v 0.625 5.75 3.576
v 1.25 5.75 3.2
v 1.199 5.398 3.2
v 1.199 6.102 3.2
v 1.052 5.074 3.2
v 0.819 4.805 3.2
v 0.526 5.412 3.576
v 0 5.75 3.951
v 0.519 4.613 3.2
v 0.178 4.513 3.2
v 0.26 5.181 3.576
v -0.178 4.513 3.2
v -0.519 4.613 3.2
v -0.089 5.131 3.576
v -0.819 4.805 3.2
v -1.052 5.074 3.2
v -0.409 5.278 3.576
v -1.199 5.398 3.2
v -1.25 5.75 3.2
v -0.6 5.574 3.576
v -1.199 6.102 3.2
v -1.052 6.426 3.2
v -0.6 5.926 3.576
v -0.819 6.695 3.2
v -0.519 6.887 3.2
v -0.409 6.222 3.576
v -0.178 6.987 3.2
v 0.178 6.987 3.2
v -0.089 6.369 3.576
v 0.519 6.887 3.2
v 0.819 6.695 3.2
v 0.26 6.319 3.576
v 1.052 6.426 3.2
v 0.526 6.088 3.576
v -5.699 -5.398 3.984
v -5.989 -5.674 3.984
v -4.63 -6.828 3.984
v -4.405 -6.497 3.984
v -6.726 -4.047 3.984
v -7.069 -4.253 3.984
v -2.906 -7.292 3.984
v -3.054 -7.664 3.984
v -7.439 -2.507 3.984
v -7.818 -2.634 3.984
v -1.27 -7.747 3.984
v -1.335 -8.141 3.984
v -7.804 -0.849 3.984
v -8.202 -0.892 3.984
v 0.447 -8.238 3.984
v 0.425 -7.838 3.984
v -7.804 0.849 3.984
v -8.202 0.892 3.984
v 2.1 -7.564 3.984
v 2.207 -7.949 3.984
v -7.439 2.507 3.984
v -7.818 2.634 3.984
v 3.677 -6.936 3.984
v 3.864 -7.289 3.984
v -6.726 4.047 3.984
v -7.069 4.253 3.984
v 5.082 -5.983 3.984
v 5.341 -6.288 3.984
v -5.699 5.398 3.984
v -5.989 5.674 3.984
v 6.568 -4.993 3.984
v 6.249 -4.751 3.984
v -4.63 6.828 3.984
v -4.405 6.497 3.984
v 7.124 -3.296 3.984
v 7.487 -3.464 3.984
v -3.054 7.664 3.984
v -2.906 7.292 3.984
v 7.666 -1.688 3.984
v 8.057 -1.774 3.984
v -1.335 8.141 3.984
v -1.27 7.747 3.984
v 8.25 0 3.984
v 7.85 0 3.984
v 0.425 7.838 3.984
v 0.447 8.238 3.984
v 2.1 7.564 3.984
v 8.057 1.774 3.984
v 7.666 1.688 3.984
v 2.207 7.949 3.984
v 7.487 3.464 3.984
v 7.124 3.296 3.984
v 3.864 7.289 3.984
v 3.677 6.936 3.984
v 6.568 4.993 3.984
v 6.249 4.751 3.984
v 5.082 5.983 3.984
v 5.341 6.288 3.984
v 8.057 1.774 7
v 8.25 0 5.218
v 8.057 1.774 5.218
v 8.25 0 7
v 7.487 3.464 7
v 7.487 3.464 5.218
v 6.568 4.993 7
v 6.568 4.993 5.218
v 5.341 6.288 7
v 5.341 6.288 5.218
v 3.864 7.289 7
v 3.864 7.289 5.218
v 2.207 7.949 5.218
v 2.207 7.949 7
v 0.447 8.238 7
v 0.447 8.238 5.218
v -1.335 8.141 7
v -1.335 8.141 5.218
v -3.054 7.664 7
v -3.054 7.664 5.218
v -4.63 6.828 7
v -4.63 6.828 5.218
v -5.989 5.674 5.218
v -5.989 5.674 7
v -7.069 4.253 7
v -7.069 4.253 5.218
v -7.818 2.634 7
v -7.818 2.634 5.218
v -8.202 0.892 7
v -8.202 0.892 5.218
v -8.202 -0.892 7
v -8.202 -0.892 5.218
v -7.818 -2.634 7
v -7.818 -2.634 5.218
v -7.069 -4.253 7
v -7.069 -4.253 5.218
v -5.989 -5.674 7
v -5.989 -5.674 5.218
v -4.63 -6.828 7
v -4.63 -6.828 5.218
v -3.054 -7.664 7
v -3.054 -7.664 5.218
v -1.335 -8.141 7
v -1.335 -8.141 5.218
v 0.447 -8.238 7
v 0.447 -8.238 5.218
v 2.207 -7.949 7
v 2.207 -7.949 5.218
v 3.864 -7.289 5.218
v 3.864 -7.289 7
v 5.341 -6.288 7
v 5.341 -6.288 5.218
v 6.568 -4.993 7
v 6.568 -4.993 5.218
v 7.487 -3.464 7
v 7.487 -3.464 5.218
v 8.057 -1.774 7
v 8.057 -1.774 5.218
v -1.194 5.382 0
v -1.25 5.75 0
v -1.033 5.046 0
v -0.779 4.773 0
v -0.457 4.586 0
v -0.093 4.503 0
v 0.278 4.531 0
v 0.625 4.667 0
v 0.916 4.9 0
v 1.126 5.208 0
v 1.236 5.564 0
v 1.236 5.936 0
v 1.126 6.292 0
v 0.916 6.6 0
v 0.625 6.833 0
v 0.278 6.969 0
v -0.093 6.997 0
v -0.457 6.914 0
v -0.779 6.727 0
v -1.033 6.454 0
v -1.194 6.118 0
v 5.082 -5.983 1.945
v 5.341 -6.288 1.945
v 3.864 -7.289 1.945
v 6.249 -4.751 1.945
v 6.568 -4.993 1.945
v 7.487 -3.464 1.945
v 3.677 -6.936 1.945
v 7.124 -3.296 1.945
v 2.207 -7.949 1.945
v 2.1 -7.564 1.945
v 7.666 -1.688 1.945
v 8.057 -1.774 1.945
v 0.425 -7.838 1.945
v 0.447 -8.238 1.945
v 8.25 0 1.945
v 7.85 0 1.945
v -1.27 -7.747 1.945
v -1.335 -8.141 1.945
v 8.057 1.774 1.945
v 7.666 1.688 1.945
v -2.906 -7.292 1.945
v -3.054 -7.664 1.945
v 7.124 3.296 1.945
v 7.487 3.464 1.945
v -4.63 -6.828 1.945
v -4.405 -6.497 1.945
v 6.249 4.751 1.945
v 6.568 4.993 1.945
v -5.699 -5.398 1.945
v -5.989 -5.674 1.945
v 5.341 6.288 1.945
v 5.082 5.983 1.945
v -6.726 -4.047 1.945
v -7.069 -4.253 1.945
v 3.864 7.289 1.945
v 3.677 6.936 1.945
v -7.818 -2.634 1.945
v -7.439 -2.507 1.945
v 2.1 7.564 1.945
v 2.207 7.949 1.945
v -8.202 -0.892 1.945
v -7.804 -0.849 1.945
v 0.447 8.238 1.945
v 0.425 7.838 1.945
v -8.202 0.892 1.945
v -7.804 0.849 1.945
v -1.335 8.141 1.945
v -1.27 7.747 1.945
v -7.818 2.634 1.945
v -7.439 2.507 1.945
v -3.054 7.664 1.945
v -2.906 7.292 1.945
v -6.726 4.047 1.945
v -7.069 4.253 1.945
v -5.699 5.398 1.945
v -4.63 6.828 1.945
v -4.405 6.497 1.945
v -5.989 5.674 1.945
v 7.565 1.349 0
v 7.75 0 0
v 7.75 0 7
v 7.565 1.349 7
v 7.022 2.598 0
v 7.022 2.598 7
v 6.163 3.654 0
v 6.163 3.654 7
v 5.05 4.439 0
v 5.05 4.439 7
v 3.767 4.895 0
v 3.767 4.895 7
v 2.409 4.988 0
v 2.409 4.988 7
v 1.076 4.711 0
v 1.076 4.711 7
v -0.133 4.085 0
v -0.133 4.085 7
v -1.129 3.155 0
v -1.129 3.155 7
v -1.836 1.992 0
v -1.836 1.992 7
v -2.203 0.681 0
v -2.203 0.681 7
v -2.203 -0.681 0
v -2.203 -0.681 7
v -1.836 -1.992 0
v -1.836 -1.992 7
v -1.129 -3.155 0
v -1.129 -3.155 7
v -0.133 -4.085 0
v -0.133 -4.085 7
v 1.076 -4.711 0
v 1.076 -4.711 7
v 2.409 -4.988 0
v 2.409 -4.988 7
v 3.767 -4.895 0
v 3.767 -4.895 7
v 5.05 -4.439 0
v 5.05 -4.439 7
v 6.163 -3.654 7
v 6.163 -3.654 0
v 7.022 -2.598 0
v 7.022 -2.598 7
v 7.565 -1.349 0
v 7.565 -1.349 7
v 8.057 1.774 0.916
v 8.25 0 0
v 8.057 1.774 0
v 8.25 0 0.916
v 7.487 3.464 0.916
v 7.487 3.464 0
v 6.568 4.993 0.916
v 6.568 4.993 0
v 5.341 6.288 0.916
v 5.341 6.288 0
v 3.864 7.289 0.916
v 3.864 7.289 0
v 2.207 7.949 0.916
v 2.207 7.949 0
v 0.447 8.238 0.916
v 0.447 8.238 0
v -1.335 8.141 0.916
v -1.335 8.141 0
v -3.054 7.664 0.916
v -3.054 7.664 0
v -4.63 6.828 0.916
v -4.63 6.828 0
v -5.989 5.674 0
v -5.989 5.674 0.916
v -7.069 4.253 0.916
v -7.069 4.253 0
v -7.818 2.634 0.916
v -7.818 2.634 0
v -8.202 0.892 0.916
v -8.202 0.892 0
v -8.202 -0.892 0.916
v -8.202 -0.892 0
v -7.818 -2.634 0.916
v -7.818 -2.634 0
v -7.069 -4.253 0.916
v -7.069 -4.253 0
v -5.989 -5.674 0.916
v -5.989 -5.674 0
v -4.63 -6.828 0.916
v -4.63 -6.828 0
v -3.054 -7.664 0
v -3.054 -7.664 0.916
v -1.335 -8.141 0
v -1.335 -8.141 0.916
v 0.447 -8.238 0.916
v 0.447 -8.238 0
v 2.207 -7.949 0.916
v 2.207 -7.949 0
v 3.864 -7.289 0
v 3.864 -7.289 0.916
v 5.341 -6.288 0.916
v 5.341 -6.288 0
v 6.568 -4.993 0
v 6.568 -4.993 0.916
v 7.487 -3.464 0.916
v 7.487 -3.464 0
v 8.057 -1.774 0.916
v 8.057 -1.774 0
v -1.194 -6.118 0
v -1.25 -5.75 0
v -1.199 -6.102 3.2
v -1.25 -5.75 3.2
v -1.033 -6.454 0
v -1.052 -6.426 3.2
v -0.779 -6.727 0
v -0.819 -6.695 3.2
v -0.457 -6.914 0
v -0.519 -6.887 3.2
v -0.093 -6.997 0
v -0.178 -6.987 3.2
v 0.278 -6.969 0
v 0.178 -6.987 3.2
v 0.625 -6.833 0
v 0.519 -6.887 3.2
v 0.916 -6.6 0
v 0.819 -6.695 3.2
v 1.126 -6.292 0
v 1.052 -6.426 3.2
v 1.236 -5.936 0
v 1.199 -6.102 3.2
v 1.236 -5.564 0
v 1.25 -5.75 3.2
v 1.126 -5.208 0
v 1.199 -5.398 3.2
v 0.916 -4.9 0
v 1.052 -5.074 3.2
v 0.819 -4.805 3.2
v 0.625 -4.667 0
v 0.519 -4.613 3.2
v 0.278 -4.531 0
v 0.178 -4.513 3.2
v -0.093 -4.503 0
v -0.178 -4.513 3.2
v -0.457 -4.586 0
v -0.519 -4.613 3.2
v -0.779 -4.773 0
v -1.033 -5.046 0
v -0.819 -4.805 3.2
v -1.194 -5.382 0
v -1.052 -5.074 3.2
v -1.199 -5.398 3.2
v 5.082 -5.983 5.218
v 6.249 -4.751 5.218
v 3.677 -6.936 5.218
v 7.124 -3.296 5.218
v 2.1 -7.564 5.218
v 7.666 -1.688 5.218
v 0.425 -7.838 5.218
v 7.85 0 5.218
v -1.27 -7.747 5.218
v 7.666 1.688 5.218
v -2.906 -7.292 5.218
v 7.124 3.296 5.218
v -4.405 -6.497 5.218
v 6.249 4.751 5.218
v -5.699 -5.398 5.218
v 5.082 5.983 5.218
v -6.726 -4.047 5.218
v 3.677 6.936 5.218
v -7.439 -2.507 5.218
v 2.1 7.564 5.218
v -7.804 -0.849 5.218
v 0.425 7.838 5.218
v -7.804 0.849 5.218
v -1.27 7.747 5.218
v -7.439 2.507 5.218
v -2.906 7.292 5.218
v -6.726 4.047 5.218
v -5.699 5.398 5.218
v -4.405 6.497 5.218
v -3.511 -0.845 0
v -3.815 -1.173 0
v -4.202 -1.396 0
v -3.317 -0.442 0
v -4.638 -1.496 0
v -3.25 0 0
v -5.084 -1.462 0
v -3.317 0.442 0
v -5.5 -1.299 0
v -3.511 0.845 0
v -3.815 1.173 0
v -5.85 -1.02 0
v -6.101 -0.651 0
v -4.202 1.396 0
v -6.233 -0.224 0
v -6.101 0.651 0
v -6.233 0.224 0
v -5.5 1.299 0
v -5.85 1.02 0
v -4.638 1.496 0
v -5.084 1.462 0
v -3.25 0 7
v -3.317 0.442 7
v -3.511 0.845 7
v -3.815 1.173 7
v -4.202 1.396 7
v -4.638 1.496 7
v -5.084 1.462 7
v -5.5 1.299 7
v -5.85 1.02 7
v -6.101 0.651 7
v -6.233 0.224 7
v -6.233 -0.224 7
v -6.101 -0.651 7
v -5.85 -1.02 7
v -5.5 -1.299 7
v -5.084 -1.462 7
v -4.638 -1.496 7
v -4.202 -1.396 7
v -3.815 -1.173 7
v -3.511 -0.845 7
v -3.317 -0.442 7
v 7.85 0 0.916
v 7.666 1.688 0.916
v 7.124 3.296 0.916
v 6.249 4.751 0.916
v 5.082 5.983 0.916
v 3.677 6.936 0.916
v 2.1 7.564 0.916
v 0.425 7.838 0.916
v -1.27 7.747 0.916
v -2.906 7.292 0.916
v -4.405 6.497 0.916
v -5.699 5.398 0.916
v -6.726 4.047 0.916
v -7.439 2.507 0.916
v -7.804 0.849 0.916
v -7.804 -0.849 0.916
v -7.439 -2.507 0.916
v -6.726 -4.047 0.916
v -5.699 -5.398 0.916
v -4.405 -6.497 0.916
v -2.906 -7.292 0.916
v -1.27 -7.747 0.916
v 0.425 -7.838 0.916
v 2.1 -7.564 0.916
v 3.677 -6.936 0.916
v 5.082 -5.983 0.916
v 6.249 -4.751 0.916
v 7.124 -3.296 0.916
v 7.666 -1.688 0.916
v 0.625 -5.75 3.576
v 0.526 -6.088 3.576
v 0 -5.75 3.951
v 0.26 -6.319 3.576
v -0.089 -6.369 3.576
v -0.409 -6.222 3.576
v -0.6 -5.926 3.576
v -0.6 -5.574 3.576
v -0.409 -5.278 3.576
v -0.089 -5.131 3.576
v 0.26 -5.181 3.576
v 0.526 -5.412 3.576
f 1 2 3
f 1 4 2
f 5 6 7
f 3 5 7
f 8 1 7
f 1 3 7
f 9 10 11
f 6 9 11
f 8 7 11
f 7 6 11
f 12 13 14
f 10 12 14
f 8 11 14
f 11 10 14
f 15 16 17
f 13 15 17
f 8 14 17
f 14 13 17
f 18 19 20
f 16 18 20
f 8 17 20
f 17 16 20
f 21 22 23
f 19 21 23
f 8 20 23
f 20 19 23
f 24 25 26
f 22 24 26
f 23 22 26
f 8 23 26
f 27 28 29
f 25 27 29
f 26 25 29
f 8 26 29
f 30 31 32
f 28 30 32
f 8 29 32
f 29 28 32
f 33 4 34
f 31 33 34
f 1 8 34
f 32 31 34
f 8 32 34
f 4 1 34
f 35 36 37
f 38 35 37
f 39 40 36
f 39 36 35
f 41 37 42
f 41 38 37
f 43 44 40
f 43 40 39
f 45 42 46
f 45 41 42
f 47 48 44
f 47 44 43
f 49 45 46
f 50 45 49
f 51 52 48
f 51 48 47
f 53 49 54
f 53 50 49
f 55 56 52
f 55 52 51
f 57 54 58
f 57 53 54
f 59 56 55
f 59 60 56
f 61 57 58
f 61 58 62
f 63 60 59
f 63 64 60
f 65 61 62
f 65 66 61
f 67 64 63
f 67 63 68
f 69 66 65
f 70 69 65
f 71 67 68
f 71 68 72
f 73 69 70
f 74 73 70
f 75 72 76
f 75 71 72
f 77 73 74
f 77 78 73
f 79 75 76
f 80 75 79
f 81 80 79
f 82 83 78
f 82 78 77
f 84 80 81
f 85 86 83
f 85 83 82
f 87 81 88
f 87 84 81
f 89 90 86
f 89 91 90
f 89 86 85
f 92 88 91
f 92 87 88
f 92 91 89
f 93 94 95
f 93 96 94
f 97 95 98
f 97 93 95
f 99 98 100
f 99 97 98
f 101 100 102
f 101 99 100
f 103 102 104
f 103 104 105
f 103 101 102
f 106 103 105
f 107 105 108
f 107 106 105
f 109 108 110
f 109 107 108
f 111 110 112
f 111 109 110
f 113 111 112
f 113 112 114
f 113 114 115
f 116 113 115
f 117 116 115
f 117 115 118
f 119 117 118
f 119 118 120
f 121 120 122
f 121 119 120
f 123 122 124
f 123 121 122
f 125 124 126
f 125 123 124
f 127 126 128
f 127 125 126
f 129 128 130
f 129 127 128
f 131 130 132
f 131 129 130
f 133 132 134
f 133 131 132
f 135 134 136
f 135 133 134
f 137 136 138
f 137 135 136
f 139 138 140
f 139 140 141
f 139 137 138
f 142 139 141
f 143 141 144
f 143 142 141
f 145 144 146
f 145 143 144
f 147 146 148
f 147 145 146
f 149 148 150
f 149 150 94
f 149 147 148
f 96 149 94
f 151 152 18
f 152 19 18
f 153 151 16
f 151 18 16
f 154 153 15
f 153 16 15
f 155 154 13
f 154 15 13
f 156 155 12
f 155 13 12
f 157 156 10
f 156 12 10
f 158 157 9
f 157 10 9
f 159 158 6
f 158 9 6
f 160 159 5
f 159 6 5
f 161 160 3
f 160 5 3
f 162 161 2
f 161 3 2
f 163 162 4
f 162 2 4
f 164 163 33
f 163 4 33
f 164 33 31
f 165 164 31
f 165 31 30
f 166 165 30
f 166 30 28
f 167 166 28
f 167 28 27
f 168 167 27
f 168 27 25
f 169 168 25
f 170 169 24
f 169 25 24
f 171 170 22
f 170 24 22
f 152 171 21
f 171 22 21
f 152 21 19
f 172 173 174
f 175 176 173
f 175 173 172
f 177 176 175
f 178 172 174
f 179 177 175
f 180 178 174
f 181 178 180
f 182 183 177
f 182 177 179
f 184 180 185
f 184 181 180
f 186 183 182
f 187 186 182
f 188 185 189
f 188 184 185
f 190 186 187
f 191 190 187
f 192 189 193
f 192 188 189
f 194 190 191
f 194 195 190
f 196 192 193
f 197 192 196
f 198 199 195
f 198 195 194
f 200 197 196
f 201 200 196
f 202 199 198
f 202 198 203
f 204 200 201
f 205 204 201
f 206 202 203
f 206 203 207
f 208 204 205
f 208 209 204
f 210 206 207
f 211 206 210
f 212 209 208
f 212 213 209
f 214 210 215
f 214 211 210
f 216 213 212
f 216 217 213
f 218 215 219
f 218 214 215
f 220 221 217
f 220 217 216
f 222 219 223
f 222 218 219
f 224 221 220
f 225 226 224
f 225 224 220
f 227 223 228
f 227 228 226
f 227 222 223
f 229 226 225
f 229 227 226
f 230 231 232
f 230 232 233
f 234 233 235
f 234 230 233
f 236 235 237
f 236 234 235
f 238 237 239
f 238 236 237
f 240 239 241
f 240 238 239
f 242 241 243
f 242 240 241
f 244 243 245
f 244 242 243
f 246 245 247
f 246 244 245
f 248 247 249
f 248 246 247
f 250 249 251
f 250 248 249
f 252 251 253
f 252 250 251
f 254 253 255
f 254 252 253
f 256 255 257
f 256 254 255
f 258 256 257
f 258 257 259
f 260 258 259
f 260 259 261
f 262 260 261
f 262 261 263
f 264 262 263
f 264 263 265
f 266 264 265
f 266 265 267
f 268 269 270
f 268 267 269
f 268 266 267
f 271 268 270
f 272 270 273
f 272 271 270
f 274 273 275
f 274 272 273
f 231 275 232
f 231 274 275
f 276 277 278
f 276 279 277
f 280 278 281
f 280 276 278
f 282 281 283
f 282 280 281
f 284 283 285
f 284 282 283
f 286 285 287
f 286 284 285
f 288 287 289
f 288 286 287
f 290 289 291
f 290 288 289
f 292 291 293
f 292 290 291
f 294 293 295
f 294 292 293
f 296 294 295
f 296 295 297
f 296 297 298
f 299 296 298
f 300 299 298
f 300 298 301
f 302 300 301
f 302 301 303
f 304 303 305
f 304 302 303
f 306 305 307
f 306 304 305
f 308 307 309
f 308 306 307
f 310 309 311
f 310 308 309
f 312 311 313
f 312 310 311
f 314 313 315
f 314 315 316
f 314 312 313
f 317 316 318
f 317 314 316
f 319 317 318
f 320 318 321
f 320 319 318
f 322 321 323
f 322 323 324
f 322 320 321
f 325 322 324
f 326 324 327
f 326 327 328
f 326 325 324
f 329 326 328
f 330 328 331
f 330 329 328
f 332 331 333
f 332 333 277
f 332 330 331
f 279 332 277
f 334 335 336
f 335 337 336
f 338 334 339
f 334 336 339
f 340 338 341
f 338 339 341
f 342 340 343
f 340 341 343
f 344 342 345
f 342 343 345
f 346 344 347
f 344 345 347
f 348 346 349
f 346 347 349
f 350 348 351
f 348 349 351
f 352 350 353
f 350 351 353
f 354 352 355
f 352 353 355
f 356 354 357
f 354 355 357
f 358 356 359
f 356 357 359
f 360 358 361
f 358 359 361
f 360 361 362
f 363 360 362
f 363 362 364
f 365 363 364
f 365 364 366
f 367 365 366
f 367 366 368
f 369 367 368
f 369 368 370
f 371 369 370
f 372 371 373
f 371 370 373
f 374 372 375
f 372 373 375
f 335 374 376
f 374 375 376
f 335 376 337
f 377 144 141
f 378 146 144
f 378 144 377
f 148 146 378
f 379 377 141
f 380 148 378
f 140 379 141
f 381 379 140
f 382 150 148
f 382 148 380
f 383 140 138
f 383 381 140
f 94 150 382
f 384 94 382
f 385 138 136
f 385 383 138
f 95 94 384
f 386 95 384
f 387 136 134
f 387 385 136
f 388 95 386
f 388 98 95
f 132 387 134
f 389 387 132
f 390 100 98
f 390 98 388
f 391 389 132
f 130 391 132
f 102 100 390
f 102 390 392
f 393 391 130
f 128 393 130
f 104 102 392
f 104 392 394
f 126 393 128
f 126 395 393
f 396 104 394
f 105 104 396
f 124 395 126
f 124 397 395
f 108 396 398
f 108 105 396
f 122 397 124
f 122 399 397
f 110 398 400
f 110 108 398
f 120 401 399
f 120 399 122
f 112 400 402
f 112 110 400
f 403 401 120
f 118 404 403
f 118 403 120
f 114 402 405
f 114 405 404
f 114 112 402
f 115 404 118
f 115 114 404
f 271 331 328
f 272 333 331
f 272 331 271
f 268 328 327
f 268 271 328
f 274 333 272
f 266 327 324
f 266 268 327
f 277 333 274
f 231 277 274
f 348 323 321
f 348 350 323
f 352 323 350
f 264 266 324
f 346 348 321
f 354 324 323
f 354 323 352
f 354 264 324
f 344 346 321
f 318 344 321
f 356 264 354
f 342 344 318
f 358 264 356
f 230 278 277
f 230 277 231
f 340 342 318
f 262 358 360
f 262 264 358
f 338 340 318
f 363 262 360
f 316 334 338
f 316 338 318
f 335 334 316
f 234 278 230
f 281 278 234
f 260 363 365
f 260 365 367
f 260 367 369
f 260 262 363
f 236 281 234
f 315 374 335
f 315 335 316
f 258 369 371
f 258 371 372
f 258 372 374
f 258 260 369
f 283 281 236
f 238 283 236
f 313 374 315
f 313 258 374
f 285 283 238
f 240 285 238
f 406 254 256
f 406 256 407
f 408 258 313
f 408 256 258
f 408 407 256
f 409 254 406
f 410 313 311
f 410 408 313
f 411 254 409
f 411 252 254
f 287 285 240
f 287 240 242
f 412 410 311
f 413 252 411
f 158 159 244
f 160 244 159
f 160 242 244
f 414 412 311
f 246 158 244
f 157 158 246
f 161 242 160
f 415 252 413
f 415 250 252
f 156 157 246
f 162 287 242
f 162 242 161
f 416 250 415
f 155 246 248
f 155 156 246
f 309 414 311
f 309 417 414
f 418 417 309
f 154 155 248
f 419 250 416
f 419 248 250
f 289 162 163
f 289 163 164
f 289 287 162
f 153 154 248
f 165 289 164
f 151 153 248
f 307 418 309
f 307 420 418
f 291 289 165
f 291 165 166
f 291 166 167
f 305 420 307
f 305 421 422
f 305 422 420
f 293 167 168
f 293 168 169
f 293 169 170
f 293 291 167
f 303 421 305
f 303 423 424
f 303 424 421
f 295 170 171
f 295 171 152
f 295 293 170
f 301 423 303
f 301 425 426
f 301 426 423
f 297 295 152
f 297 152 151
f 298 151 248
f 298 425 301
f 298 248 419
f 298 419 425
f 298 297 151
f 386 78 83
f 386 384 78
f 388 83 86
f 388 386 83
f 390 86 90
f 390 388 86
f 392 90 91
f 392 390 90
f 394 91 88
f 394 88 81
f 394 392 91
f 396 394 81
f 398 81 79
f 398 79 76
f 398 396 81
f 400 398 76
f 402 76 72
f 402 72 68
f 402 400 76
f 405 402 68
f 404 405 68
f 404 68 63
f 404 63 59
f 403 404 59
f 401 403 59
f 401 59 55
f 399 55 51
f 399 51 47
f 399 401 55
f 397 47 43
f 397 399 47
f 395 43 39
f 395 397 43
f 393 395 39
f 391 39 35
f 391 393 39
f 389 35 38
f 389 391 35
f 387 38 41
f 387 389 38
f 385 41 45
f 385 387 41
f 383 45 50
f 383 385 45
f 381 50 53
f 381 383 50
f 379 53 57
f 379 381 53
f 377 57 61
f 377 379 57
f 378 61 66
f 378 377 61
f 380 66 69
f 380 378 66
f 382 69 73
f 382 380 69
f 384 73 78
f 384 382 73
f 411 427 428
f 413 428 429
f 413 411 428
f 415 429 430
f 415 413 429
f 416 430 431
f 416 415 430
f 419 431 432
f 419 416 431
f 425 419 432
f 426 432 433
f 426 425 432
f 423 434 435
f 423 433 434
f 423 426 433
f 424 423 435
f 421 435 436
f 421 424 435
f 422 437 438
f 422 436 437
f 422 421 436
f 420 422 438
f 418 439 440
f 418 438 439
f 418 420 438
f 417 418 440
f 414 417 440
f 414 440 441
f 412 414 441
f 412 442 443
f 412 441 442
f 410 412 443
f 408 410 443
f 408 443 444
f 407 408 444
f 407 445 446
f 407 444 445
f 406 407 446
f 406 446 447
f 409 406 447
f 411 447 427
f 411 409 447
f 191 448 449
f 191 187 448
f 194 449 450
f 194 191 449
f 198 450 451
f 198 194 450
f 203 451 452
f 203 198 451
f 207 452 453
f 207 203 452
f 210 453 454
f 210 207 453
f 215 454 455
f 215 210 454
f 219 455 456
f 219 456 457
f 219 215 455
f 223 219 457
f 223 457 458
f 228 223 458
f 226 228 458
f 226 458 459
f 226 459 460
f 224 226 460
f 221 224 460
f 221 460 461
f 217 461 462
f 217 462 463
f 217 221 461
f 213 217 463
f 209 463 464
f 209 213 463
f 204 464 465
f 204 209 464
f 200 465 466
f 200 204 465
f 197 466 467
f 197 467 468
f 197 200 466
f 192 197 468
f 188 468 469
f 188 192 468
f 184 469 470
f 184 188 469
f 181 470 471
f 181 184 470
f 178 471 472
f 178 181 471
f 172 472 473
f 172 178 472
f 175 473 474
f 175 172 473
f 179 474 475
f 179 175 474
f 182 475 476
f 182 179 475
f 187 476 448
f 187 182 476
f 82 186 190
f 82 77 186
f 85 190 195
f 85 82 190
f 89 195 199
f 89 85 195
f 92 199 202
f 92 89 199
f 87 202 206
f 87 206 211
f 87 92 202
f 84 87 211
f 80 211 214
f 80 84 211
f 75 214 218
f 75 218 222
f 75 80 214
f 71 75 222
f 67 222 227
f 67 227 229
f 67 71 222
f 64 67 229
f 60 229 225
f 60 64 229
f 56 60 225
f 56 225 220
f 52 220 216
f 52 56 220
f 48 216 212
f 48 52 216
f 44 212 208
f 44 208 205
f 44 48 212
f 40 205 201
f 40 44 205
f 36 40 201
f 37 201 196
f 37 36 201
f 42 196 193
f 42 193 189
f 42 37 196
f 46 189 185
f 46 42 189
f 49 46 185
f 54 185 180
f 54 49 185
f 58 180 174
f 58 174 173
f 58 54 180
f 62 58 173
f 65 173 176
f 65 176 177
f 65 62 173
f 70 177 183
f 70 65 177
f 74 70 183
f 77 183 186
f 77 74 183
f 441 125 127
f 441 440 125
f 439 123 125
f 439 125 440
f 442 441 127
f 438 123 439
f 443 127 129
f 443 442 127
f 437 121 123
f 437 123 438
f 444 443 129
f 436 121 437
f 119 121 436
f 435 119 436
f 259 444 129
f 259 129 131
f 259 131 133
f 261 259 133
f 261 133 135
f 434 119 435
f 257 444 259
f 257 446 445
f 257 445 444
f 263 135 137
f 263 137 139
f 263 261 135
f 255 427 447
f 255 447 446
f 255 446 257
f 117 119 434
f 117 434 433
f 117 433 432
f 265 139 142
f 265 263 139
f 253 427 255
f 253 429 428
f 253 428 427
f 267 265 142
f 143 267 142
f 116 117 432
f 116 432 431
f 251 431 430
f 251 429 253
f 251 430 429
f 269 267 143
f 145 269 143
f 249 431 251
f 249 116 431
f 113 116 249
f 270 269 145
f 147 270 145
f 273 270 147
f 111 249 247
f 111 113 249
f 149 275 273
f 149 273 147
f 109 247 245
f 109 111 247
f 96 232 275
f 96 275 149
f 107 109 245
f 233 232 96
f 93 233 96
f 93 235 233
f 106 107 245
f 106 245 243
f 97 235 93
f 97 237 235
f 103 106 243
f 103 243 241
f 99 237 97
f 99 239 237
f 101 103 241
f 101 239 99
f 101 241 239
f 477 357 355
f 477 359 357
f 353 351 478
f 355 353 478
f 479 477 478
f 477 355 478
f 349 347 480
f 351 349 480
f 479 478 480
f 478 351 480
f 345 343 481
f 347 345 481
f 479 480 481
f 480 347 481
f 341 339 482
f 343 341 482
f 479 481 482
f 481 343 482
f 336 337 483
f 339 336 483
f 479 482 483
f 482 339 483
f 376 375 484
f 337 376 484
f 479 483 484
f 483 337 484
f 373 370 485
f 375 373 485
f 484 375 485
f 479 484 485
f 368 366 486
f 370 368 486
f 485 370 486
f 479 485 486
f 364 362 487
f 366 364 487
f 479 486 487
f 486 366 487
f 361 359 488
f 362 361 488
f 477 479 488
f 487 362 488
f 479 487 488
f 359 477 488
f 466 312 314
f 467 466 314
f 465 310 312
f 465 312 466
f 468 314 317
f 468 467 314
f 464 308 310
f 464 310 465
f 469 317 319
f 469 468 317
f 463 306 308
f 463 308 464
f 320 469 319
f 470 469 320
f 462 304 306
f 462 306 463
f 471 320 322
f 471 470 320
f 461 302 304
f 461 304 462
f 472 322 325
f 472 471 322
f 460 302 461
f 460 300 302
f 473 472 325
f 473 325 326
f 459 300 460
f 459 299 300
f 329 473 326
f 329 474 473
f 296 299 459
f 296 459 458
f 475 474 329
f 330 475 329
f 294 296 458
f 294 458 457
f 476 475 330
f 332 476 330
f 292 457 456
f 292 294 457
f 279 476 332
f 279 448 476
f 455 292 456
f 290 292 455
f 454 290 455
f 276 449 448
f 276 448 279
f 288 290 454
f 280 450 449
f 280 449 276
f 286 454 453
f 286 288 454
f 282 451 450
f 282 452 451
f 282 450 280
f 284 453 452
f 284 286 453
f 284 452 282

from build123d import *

# Parameters (mm, degrees)
F2_R     = 5
F2_R_2   = 1.5
F3_DEPTH = 7.001
F4_D     = 2.5
F4_DEPTH = 3.2
F4_TIP   = 0.7510757738
F2_R_3   = 1.2
F5_DEPTH = 3.2


with BuildPart() as f1:
    # F0 (on Front) → F1 (revolve)
    with BuildSketch(Plane.XZ):
        Polygon((8.25, 7), (0, 7), (0, 0), (8.25, 0), (8.25, 0.9163741209), (7.85, 0.9163741209), (7.85, 1.9445925065), (8.25, 1.9445925065), (8.25, 3.9838924357), (7.85, 3.9838924357), (7.85, 5.2177544985), (8.25, 5.2177544985), align=None)
    revolve(axis=Axis((0, 0, 3.5), (0, 0, 1)))

    # F2 (on Top) → F3 (cut, through all)
    with BuildSketch(Plane.XY):
        with Locations((2.75, 0)):
            Circle(F2_R)
        with Locations((-4.75, 0)):
            Circle(F2_R_2)
    extrude(amount=F3_DEPTH, mode=Mode.SUBTRACT)

    # F4
    with Locations(Plane(origin=(0, 0, 0), x_dir=(1, 0, 0), z_dir=(0, 0, -1))):
        with Locations((0, 5.75), (0, -5.75)):
            Hole(F4_D / 2, depth=F4_DEPTH)
            with Locations((0, 0, -(F4_DEPTH + F4_TIP / 2))):  # 118° drill point
                Cone(0, F4_D / 2, F4_TIP, mode=Mode.SUBTRACT)

    # F2 (on Top) → F5 (cut)
    with BuildSketch(Plane.XY):
        with Locations((0, 5.75)):
            Circle(F2_R_3)
        with Locations((0, -5.75)):
            Circle(F2_R_3)
    extrude(amount=F5_DEPTH, mode=Mode.SUBTRACT)


solid = f1.part
